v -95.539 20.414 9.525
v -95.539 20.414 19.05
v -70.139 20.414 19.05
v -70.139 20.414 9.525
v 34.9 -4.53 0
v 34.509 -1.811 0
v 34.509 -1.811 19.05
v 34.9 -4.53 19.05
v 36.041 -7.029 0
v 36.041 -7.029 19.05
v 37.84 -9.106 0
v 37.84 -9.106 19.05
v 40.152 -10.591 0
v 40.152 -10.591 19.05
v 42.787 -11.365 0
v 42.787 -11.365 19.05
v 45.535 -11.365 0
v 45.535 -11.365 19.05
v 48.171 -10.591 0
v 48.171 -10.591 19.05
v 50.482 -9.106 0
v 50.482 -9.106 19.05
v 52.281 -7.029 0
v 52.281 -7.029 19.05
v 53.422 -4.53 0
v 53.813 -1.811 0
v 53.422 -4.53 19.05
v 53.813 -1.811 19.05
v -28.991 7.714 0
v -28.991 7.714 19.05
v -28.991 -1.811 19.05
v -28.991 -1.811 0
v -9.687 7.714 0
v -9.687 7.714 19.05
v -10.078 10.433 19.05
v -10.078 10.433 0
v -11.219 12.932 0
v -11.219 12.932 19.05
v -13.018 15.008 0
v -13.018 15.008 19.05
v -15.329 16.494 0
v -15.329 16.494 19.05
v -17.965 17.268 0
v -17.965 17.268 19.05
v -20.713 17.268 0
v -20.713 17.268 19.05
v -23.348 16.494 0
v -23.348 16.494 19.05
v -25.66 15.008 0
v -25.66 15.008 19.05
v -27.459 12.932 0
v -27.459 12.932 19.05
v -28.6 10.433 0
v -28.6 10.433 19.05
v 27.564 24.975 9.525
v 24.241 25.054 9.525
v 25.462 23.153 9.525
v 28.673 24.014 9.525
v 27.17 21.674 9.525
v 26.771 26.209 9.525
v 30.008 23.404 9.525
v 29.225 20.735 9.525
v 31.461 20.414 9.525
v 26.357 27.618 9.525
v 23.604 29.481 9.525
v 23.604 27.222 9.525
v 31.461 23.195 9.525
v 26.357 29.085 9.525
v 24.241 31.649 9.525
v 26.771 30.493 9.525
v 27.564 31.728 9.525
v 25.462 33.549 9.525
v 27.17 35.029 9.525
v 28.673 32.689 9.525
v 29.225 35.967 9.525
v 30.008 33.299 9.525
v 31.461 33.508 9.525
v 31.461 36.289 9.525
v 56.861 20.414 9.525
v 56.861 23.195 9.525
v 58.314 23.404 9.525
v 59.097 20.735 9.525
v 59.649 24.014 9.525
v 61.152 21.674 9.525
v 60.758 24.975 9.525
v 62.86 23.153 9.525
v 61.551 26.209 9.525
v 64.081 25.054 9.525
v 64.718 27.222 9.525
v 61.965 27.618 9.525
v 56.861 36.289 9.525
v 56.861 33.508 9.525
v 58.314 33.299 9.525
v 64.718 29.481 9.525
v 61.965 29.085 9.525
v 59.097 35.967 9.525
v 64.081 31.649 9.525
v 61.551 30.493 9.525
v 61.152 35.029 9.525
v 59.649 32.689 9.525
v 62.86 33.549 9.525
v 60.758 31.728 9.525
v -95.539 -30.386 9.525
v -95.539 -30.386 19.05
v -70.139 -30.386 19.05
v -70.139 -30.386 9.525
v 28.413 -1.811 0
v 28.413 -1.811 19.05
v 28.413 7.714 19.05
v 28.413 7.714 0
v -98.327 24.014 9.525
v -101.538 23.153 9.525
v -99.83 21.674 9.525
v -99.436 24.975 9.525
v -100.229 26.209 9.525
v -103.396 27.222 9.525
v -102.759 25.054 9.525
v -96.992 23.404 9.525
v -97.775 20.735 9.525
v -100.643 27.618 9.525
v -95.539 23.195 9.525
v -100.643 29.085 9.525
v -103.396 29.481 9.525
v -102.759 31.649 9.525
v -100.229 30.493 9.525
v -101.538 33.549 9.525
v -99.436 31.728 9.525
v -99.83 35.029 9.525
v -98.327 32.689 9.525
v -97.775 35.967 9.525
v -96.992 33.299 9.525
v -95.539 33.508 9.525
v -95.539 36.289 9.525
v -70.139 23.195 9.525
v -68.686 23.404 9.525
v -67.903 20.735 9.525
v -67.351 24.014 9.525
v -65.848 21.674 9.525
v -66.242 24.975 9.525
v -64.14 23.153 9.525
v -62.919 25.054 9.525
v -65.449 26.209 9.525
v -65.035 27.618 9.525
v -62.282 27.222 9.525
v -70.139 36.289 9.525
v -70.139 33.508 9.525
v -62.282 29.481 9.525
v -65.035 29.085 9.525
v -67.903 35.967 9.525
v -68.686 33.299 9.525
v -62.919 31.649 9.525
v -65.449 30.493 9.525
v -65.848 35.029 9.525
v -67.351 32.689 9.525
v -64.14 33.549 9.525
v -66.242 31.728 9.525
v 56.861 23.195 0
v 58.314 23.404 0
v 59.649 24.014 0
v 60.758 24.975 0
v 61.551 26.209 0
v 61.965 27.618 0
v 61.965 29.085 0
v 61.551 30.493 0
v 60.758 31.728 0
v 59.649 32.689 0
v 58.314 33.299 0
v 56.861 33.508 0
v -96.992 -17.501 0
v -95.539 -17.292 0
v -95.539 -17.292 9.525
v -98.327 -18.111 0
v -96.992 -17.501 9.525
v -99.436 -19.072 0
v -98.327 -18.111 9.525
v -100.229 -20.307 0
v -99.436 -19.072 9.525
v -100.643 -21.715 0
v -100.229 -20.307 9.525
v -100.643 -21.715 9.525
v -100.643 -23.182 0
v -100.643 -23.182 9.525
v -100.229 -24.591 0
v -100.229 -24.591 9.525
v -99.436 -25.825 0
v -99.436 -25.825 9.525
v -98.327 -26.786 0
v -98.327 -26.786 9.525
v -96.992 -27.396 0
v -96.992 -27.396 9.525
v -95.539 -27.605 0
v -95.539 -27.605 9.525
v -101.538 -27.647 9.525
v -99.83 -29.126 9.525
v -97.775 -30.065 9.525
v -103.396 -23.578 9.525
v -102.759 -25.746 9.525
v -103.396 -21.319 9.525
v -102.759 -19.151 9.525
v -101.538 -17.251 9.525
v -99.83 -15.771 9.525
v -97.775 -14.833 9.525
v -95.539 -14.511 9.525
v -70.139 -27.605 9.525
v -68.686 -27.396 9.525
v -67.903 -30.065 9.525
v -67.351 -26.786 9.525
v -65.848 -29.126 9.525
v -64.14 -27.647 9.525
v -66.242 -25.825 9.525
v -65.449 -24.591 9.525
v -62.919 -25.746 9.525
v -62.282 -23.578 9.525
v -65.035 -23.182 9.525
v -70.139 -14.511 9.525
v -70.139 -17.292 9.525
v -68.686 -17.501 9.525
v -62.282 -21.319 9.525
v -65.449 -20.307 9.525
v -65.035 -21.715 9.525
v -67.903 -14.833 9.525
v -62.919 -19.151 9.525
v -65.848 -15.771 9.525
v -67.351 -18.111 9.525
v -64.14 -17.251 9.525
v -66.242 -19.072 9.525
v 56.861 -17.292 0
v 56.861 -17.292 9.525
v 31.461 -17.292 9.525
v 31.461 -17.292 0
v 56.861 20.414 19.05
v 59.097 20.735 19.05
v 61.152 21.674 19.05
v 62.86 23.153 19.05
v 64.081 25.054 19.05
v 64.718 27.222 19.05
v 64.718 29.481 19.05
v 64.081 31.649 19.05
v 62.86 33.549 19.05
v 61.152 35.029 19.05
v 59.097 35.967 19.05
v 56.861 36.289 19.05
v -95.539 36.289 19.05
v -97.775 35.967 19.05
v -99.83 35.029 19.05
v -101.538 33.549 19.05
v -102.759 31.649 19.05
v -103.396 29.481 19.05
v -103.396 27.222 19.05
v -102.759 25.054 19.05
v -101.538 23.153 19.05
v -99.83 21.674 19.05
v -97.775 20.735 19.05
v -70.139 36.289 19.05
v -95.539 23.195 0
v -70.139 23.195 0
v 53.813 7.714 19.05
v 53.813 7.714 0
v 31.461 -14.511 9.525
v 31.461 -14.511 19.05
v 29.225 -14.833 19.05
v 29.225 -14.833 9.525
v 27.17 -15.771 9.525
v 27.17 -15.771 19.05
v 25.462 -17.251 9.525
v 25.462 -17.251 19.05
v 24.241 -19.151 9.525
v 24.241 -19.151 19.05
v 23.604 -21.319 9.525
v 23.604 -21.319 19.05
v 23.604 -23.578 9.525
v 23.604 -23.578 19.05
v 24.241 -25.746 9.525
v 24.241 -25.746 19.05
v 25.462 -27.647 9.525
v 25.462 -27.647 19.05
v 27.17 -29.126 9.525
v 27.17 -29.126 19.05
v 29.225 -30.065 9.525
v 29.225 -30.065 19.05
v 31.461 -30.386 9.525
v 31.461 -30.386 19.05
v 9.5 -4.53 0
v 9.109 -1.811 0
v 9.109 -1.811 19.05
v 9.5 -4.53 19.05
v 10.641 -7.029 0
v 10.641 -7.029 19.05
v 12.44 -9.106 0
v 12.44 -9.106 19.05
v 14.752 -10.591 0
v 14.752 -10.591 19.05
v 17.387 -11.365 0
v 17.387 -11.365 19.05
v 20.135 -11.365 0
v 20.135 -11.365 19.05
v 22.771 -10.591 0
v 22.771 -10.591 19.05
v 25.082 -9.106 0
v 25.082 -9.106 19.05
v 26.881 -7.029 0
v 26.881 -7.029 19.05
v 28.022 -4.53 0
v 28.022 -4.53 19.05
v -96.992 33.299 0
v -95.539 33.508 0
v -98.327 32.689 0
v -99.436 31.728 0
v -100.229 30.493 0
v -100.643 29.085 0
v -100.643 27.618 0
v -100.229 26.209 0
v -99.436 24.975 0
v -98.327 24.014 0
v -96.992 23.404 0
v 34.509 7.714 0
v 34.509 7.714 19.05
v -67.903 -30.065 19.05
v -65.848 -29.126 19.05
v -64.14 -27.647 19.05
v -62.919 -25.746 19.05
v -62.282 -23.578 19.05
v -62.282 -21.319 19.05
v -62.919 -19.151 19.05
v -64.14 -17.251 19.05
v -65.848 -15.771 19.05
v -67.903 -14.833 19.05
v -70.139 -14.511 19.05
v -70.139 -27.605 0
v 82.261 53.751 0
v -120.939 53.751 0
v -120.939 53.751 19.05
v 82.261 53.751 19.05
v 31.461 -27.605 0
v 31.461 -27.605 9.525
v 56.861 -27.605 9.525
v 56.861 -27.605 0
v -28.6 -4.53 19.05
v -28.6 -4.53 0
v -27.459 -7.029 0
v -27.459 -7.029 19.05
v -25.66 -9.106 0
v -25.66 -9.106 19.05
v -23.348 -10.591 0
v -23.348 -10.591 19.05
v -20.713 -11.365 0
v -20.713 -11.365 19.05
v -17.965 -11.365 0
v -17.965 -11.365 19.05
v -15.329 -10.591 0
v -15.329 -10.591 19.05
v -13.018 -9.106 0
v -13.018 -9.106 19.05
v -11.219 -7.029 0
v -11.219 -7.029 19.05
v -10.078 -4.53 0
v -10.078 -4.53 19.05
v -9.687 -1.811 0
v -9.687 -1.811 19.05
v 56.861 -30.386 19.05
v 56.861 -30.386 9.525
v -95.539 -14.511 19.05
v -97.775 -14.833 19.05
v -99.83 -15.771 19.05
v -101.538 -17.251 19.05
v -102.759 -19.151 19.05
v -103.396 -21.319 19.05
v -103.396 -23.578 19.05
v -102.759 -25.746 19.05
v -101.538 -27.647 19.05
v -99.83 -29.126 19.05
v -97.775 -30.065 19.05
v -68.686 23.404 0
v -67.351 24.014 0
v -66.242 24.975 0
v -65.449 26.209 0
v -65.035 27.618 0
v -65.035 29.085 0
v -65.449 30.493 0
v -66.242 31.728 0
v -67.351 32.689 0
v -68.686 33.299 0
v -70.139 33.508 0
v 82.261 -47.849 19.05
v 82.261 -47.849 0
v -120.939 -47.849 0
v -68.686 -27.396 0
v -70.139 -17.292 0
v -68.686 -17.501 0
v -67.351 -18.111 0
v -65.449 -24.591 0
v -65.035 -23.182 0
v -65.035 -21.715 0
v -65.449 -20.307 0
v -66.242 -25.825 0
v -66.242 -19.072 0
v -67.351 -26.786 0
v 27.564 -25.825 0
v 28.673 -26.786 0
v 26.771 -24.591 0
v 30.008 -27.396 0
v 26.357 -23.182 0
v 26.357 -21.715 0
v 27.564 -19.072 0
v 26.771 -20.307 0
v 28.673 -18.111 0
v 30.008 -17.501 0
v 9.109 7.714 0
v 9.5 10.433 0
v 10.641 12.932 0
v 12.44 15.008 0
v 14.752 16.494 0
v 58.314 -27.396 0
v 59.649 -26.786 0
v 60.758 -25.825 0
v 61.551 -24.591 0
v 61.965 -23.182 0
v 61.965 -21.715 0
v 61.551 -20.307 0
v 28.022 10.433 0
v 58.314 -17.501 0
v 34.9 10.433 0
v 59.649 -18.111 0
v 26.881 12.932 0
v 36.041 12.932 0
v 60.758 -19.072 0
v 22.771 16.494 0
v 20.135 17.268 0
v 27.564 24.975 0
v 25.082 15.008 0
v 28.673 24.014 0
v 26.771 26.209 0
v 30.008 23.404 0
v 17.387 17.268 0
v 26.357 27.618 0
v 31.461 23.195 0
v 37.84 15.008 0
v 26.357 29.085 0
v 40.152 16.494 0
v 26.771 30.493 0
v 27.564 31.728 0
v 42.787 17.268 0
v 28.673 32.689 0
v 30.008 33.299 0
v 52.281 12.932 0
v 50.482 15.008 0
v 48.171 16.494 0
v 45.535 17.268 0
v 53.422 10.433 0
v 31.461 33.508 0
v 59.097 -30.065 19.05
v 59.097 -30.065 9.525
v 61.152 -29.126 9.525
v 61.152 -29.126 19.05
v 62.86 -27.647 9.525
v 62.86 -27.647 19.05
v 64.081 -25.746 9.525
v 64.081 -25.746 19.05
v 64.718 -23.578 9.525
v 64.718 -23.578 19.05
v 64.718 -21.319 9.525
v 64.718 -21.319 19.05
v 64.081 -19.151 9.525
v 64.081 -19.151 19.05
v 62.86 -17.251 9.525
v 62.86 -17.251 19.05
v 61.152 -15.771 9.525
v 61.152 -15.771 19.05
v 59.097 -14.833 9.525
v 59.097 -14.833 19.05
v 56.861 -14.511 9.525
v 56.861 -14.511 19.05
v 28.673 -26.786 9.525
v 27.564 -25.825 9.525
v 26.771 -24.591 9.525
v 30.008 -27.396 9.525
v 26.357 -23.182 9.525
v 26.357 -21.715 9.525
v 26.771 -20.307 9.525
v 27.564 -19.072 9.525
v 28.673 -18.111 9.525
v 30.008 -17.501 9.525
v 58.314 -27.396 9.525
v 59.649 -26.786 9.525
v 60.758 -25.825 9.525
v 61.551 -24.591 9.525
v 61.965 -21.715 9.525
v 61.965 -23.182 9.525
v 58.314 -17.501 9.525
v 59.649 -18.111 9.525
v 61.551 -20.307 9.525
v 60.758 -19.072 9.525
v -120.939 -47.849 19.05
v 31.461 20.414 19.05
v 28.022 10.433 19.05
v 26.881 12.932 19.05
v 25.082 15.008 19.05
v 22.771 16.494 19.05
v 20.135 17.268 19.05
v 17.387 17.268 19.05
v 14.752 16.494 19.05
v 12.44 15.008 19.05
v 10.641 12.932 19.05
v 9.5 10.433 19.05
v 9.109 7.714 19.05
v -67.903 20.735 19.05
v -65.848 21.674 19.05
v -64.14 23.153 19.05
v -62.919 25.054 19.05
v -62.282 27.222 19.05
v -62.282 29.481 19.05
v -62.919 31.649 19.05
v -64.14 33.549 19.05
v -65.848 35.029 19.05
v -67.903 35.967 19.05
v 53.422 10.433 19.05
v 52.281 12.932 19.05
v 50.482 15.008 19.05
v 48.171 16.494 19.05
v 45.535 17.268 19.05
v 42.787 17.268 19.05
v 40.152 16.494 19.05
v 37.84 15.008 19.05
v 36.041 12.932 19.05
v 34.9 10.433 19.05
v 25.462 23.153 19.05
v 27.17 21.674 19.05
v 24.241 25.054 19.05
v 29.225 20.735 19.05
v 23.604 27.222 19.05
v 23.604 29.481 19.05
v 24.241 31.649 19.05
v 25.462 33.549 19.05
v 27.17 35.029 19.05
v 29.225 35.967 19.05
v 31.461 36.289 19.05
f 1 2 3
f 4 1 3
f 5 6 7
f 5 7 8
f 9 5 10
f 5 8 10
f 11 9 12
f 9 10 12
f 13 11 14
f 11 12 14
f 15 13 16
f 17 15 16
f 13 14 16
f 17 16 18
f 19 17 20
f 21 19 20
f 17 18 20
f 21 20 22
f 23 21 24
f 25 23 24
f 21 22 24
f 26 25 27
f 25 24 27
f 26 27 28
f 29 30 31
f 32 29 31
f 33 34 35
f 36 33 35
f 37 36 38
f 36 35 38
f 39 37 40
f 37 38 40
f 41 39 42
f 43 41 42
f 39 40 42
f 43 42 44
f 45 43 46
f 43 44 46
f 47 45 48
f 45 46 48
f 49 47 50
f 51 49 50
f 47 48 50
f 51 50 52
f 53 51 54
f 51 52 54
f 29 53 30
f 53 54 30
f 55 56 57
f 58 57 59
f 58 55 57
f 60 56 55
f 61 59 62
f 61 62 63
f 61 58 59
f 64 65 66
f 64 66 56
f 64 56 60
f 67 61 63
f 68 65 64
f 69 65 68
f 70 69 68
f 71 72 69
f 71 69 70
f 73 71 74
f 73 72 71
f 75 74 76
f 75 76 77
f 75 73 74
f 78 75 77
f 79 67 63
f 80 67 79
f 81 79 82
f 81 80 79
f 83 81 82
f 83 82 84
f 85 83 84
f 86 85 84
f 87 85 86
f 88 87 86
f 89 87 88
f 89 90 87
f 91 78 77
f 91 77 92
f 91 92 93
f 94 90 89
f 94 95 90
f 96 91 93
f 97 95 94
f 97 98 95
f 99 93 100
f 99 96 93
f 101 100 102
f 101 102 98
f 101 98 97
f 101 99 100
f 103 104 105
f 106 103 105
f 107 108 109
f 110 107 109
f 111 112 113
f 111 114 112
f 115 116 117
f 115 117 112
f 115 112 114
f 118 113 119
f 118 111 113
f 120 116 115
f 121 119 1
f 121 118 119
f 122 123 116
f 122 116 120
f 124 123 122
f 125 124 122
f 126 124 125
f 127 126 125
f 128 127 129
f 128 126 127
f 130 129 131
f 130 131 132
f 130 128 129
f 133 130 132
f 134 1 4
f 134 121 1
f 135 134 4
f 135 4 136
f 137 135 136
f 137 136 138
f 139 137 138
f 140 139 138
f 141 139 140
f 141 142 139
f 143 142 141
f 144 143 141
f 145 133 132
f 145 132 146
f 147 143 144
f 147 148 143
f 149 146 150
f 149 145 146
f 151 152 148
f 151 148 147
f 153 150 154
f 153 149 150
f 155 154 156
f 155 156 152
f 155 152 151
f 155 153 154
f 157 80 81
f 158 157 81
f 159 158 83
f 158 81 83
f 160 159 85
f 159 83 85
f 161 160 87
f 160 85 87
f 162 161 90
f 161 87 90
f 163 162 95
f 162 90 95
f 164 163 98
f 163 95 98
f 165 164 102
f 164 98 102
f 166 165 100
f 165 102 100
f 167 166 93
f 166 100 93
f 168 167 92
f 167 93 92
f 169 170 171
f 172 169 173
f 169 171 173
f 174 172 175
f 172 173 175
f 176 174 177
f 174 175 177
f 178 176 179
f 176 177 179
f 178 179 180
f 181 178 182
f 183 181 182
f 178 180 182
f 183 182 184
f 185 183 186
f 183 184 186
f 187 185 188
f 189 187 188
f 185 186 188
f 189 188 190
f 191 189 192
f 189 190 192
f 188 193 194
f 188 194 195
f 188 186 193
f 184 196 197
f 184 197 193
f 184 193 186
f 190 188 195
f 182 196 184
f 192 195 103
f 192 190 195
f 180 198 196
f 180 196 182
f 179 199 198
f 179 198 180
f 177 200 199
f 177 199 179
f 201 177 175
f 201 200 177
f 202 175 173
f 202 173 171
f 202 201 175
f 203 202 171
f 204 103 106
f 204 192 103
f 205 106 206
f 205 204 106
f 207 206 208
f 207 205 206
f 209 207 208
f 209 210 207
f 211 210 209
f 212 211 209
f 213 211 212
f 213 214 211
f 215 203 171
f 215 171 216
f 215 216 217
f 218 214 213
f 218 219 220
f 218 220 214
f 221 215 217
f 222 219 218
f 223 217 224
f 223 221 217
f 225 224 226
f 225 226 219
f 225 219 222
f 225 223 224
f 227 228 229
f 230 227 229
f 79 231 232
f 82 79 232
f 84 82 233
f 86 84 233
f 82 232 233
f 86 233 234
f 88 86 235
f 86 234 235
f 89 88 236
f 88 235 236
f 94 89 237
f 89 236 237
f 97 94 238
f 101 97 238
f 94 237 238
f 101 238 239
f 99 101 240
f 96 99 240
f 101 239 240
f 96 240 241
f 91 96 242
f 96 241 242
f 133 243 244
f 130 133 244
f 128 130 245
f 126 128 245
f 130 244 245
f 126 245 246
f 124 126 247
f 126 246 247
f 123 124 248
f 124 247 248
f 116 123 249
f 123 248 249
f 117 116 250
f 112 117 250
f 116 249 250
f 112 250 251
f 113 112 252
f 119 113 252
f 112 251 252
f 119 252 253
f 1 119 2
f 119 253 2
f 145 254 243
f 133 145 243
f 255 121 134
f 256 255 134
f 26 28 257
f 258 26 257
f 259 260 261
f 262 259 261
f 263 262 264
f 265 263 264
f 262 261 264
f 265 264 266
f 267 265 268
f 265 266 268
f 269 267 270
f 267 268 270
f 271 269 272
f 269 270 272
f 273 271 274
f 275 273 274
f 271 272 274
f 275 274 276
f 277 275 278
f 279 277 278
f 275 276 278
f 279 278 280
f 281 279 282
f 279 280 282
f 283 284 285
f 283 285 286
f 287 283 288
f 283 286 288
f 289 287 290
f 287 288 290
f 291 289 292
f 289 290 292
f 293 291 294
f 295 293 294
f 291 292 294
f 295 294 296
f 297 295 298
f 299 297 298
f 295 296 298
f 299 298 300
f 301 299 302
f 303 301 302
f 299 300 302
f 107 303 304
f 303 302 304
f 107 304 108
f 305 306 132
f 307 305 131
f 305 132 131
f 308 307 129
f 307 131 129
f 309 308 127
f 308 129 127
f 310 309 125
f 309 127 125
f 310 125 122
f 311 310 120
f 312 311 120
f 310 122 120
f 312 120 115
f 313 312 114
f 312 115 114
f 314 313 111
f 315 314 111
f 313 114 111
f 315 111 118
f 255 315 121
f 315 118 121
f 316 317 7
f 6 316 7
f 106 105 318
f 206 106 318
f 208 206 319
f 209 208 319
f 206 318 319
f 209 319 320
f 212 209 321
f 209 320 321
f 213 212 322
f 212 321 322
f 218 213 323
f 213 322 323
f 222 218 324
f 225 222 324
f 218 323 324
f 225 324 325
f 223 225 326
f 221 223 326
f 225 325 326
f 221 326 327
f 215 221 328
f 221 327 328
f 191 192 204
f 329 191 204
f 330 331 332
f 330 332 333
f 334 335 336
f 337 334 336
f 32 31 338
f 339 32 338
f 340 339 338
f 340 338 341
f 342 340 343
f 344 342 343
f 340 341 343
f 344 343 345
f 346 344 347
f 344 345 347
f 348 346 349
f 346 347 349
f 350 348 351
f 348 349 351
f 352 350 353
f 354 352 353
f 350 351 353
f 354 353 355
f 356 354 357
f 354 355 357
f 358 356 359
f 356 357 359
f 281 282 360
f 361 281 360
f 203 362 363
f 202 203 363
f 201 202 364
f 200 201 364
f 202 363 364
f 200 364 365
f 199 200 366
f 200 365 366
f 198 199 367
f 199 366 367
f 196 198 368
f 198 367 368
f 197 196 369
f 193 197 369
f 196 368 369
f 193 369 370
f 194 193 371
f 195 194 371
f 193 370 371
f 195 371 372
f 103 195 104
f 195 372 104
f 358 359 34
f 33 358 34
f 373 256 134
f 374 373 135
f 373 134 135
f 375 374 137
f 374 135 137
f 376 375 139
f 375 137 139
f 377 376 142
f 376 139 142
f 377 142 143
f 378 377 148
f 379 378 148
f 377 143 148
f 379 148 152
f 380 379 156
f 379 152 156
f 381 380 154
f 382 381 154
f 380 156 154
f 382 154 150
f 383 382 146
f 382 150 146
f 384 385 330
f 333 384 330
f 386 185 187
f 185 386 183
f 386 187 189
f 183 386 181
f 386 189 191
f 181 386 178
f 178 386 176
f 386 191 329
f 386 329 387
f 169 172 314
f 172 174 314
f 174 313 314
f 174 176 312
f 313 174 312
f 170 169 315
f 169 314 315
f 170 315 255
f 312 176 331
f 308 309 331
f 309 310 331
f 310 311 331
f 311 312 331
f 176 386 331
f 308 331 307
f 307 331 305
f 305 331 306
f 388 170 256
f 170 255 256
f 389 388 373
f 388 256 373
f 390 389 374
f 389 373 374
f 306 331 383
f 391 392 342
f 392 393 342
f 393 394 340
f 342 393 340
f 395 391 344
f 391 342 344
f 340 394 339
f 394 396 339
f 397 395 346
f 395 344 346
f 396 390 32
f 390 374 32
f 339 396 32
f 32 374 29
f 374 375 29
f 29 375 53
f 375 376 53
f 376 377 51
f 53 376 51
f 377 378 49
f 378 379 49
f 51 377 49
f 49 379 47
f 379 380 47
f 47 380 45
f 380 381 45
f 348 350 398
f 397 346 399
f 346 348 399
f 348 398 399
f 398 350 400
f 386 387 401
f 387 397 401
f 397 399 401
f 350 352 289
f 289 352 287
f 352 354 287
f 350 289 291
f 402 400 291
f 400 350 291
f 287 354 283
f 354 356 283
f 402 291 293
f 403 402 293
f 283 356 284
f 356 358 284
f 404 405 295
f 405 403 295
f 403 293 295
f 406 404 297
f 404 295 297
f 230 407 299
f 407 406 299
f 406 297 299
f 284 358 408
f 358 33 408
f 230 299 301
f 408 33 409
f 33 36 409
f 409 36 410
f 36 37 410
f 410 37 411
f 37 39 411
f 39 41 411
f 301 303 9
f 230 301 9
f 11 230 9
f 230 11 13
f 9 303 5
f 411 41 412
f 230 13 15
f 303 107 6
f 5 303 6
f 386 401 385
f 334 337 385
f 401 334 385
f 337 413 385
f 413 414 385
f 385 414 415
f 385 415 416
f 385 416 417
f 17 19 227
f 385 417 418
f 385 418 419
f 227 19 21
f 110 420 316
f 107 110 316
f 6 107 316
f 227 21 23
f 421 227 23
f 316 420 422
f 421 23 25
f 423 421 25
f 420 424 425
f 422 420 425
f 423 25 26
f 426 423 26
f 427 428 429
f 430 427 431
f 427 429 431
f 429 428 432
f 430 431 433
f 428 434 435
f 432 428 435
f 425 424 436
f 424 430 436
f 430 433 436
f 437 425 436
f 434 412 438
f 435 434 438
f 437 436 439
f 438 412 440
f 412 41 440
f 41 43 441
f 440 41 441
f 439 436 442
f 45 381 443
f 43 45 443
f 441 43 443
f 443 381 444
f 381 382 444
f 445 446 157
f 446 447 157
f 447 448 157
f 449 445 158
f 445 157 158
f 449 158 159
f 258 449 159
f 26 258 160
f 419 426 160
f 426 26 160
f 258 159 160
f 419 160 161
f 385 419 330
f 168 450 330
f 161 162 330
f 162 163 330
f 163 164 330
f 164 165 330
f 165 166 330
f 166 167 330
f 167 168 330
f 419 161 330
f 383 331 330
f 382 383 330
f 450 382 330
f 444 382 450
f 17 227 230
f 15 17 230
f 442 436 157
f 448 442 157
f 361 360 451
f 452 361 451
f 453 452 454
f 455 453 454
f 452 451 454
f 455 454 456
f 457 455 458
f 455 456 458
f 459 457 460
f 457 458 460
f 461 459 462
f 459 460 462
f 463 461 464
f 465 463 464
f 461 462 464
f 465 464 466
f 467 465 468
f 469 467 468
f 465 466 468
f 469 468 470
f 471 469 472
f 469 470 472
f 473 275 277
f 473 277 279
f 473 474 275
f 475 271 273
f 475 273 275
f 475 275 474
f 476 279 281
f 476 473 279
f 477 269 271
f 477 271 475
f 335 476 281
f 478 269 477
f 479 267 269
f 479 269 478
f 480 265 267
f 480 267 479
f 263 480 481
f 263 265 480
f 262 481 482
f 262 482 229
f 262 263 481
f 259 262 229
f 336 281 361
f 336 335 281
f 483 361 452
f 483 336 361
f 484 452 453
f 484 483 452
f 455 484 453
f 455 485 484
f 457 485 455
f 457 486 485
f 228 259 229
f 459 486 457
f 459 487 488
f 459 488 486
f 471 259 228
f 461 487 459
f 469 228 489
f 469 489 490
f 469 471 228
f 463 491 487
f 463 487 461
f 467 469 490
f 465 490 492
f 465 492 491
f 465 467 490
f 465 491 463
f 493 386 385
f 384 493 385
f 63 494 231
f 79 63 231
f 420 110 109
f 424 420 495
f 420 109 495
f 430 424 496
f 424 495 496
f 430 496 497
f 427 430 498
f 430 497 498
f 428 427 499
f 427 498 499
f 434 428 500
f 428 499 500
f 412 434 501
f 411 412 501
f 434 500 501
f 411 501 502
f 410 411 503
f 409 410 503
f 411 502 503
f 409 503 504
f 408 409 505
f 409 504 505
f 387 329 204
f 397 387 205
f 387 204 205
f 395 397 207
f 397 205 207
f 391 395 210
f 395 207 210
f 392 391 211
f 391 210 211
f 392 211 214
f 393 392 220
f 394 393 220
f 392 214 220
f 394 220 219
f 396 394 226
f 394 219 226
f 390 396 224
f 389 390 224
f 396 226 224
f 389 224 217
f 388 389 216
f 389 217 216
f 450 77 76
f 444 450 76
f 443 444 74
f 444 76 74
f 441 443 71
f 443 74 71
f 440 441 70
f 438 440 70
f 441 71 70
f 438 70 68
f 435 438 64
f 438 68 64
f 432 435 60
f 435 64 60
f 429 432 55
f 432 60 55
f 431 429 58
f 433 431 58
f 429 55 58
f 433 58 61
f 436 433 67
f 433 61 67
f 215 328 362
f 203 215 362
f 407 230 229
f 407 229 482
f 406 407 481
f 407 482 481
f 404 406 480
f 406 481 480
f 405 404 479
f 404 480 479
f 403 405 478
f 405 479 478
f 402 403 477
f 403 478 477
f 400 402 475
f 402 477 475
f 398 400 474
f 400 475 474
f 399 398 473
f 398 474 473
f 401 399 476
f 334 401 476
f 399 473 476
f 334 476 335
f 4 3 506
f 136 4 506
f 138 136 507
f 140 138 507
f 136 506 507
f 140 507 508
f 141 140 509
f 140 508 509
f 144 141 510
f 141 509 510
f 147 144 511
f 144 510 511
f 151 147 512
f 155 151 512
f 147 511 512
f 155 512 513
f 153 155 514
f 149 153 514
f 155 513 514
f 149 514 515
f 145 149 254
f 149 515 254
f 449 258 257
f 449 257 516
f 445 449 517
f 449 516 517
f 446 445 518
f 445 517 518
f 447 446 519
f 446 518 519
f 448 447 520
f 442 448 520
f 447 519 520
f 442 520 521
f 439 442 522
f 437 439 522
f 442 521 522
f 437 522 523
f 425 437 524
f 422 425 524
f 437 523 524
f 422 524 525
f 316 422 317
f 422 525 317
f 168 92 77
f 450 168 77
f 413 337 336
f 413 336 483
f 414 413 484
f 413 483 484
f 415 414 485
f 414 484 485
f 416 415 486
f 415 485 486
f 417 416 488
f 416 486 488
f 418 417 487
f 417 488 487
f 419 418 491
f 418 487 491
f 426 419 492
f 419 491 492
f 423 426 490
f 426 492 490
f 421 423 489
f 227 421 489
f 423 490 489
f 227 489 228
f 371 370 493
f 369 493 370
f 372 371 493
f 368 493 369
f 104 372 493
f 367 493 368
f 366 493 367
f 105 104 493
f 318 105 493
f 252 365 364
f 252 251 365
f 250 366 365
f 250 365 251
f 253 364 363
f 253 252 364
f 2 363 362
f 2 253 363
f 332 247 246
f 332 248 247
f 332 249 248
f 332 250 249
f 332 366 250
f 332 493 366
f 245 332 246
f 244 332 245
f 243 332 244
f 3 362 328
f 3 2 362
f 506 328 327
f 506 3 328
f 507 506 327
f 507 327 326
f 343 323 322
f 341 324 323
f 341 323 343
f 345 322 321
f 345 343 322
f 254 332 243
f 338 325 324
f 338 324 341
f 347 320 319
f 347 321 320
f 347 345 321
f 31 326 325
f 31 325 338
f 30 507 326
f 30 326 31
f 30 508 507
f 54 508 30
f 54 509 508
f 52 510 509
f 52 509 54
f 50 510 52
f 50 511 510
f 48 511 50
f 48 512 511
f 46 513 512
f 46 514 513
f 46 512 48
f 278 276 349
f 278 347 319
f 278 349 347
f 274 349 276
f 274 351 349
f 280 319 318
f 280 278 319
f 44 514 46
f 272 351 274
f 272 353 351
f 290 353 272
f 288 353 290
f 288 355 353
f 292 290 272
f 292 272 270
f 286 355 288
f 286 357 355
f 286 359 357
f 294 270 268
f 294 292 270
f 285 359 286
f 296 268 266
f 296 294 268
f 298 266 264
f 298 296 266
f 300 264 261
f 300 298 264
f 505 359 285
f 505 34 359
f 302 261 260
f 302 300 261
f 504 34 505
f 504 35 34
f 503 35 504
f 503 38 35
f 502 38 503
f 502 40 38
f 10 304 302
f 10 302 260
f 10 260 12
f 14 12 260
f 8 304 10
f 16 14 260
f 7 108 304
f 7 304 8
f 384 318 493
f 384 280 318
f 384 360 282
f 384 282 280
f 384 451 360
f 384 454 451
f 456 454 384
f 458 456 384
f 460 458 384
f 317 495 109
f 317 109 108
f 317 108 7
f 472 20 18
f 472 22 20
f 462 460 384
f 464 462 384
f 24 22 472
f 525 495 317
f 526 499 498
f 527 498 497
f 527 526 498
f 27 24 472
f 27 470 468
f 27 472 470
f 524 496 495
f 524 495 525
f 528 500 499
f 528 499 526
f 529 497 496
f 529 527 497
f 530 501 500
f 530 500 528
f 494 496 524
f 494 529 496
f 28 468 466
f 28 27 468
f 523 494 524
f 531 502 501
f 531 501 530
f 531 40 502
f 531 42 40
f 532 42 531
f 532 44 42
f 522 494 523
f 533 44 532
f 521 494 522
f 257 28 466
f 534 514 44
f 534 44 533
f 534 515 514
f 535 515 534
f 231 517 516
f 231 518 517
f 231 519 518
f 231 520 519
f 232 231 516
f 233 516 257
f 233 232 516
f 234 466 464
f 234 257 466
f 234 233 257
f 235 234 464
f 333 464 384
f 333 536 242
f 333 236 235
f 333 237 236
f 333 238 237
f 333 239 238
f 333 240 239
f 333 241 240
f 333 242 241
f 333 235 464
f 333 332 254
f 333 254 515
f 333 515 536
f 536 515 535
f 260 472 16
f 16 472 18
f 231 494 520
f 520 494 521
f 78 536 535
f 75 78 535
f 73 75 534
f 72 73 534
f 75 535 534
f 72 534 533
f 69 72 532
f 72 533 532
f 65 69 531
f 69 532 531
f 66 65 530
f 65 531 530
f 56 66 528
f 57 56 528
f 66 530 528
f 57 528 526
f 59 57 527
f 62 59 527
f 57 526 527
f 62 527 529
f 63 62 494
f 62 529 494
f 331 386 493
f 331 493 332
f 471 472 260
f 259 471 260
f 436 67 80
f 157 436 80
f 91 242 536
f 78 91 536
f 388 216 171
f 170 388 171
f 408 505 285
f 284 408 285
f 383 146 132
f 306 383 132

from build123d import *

# Parameters (mm, degrees)
F0_W     = 203.2
F0_H     = 101.6
F1_DEPTH = 19.05
F3_DEPTH = 19.051
F4_DEPTH = 9.525
F6_DEPTH = 19.051


with BuildPart() as f1:
    # F0 (on Top) → F1 (new body)
    with BuildSketch(Plane.XY):
        with Locations((-19.338908, 2.951313)):
            Rectangle(F0_W, F0_H)
    extrude(amount=F1_DEPTH)

    # F2 (on face) → F3 (cut, through all)
    with BuildSketch(Plane.XY.offset(19.05)):
        with BuildLine():
            ThreePointArc((-95.538908, 33.507513), (-100.695108, 28.351313), (-95.538908, 23.195113))
            Line((-95.538908, 23.195113), (-70.138908, 23.195113))
            ThreePointArc((-70.138908, 23.195113), (-64.982708, 28.351313), (-70.138908, 33.507513))
            Line((-70.138908, 33.507513), (-95.538908, 33.507513))
        make_face()
        with BuildLine():
            Line((56.861092, 33.507513), (31.461092, 33.507513))
            ThreePointArc((31.461092, 33.507513), (26.304892, 28.351313), (31.461092, 23.195113))
            Line((31.461092, 23.195113), (56.861092, 23.195113))
            ThreePointArc((56.861092, 23.195113), (62.017292, 28.351313), (56.861092, 33.507513))
        make_face()
        with BuildLine():
            Line((31.461092, -27.604887), (56.861092, -27.604887))
            ThreePointArc((56.861092, -27.604887), (62.017292, -22.448687), (56.861092, -17.292487))
            Line((56.861092, -17.292487), (31.461092, -17.292487))
            ThreePointArc((31.461092, -17.292487), (26.304892, -22.448687), (31.461092, -27.604887))
        make_face()
        with BuildLine():
            Line((-70.138908, -17.292487), (-95.538908, -17.292487))
            ThreePointArc((-95.538908, -17.292487), (-100.695108, -22.448687), (-95.538908, -27.604887))
            Line((-95.538908, -27.604887), (-70.138908, -27.604887))
            ThreePointArc((-70.138908, -27.604887), (-64.982708, -22.448687), (-70.138908, -17.292487))
        make_face()
    extrude(amount=-F3_DEPTH, mode=Mode.SUBTRACT)

    # F2 (on face) → F4 (cut)
    with BuildSketch(Plane.XY.offset(19.05)):
        with BuildLine():
            ThreePointArc((-95.538908, 33.507513), (-100.695108, 28.351313), (-95.538908, 23.195113))
            Line((-95.538908, 23.195113), (-70.138908, 23.195113))
            ThreePointArc((-70.138908, 23.195113), (-64.982708, 28.351313), (-70.138908, 33.507513))
            Line((-70.138908, 33.507513), (-95.538908, 33.507513))
        make_face()
        with BuildLine():
            ThreePointArc((-95.538908, 36.288813), (-103.476408, 28.351313), (-95.538908, 20.413813))
            Line((-95.538908, 20.413813), (-70.138908, 20.413813))
            ThreePointArc((-70.138908, 20.413813), (-62.201408, 28.351313), (-70.138908, 36.288813))
            Line((-70.138908, 36.288813), (-95.538908, 36.288813))
        make_face()
        with BuildLine():
            Line((-70.138908, 23.195113), (-95.538908, 23.195113))
            ThreePointArc((-95.538908, 23.195113), (-100.695108, 28.351313), (-95.538908, 33.507513))
            Line((-95.538908, 33.507513), (-70.138908, 33.507513))
            ThreePointArc((-70.138908, 33.507513), (-64.982708, 28.351313), (-70.138908, 23.195113))
        make_face(mode=Mode.SUBTRACT)
        with BuildLine():
            Line((56.861092, 36.288813), (31.461092, 36.288813))
            ThreePointArc((31.461092, 36.288813), (23.523592, 28.351313), (31.461092, 20.413813))
            Line((31.461092, 20.413813), (56.861092, 20.413813))
            ThreePointArc((56.861092, 20.413813), (64.798592, 28.351313), (56.861092, 36.288813))
        make_face()
        with BuildLine():
            ThreePointArc((31.461092, 23.195113), (26.304892, 28.351313), (31.461092, 33.507513))
            Line((31.461092, 33.507513), (56.861092, 33.507513))
            ThreePointArc((56.861092, 33.507513), (62.017292, 28.351313), (56.861092, 23.195113))
            Line((56.861092, 23.195113), (31.461092, 23.195113))
        make_face(mode=Mode.SUBTRACT)
        with BuildLine():
            Line((-95.538908, -30.386187), (-70.138908, -30.386187))
            ThreePointArc((-70.138908, -30.386187), (-62.201408, -22.448687), (-70.138908, -14.511187))
            Line((-70.138908, -14.511187), (-95.538908, -14.511187))
            ThreePointArc((-95.538908, -14.511187), (-103.476408, -22.448687), (-95.538908, -30.386187))
        make_face()
        with BuildLine():
            ThreePointArc((-95.538908, -27.604887), (-100.695108, -22.448687), (-95.538908, -17.292487))
            Line((-95.538908, -17.292487), (-70.138908, -17.292487))
            ThreePointArc((-70.138908, -17.292487), (-64.982708, -22.448687), (-70.138908, -27.604887))
            Line((-70.138908, -27.604887), (-95.538908, -27.604887))
        make_face(mode=Mode.SUBTRACT)
        with BuildLine():
            Line((31.461092, -30.386187), (56.861092, -30.386187))
            ThreePointArc((56.861092, -30.386187), (64.798592, -22.448687), (56.861092, -14.511187))
            Line((56.861092, -14.511187), (31.461092, -14.511187))
            ThreePointArc((31.461092, -14.511187), (23.523592, -22.448687), (31.461092, -30.386187))
        make_face()
        with BuildLine():
            ThreePointArc((56.861092, -17.292487), (62.017292, -22.448687), (56.861092, -27.604887))
            Line((56.861092, -27.604887), (31.461092, -27.604887))
            ThreePointArc((31.461092, -27.604887), (26.304892, -22.448687), (31.461092, -17.292487))
            Line((31.461092, -17.292487), (56.861092, -17.292487))
        make_face(mode=Mode.SUBTRACT)
    extrude(amount=-F4_DEPTH, mode=Mode.SUBTRACT)

    # F5 (on face) → F6 (cut, through all)
    with BuildSketch(Plane.XY.offset(19.05)):
        with BuildLine():
            Line((-28.990908, 7.713813), (-28.990908, 2.951313))
            Line((-28.990908, 2.951313), (-19.338908, 2.951313))
            Line((-19.338908, 2.951313), (-9.686908, 2.951313))
            Line((-9.686908, 2.951313), (-9.686908, 7.713813))
            ThreePointArc((-9.686908, 7.713813), (-19.338908, 17.365813), (-28.990908, 7.713813))
        make_face()
        with BuildLine():
            Line((-19.338908, 2.951313), (-28.990908, 2.951313))
            Line((-28.990908, 2.951313), (-28.990908, -1.811187))
            ThreePointArc((-28.990908, -1.811187), (-19.338908, -11.463187), (-9.686908, -1.811187))
            Line((-9.686908, -1.811187), (-9.686908, 2.951313))
            Line((-9.686908, 2.951313), (-19.338908, 2.951313))
        make_face()
        with BuildLine():
            Line((9.109092, 7.713813), (9.109092, 2.951313))
            Line((9.109092, 2.951313), (18.761092, 2.951313))
            Line((18.761092, 2.951313), (28.413092, 2.951313))
            Line((28.413092, 2.951313), (28.413092, 7.713813))
            ThreePointArc((28.413092, 7.713813), (18.761092, 17.365813), (9.109092, 7.713813))
        make_face()
        with BuildLine():
            Line((18.761092, 2.951313), (9.109092, 2.951313))
            Line((9.109092, 2.951313), (9.109092, -1.811187))
            ThreePointArc((9.109092, -1.811187), (18.761092, -11.463187), (28.413092, -1.811187))
            Line((28.413092, -1.811187), (28.413092, 2.951313))
            Line((28.413092, 2.951313), (18.761092, 2.951313))
        make_face()
        with BuildLine():
            Line((44.161092, 2.951313), (53.813092, 2.951313))
            Line((53.813092, 2.951313), (53.813092, 7.713813))
            ThreePointArc((53.813092, 7.713813), (44.161092, 17.365813), (34.509092, 7.713813))
            Line((34.509092, 7.713813), (34.509092, 2.951313))
            Line((34.509092, 2.951313), (44.161092, 2.951313))
        make_face()
        with BuildLine():
            Line((53.813092, -1.811187), (53.813092, 2.951313))
            Line((53.813092, 2.951313), (44.161092, 2.951313))
            Line((44.161092, 2.951313), (34.509092, 2.951313))
            Line((34.509092, 2.951313), (34.509092, -1.811187))
            ThreePointArc((34.509092, -1.811187), (44.161092, -11.463187), (53.813092, -1.811187))
        make_face()
    extrude(amount=-F6_DEPTH, mode=Mode.SUBTRACT)


solid = f1.part
